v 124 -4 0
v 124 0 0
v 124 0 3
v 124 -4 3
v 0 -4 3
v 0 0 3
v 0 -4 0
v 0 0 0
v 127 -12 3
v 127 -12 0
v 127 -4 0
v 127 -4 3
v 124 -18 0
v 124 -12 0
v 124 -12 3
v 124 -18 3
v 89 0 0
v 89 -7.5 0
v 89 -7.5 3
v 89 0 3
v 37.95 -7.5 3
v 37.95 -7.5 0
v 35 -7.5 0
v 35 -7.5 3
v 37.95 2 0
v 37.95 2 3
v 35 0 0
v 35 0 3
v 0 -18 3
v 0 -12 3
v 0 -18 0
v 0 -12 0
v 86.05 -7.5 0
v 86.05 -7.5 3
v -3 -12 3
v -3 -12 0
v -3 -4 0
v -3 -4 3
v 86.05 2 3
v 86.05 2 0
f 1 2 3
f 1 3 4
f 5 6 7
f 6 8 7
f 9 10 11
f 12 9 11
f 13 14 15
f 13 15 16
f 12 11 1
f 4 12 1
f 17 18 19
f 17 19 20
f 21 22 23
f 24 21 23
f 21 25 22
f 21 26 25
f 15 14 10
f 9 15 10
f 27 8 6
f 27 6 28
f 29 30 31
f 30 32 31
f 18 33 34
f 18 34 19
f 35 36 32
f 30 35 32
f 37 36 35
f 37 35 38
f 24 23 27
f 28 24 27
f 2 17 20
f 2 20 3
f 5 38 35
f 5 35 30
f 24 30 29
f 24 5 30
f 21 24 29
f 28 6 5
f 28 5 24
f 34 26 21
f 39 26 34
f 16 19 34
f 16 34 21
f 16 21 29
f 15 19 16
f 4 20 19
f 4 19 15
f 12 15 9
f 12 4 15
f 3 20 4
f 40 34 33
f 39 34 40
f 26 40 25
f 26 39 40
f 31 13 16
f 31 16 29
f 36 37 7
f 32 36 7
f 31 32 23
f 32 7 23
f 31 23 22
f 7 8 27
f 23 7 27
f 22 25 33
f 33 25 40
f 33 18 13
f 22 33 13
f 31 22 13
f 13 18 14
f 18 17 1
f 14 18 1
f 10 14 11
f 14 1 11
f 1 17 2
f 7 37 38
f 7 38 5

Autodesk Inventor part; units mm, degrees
ref_plane "YZ Plane" through (0, 0, 0) normal (1, 0, 0) x (0, 1, 0)
ref_plane "XZ Plane" through (0, 0, 0) normal (0, 1, 0) x (-1, 0, 0)
ref_plane "XY Plane" through (0, 0, 0) normal (0, 0, 1) x (1, 0, 0)
sketch "草圖1" plane through (0, 0, 0) normal (0, 0, 1) x (1, 0, 0)
  line L0 (0, 0) -> (124, 0)
  line L1 (124, 0) -> (124, -18) construction
  line L2 (124, -18) -> (0, -18)
  line L3 (0, -18) -> (0, 0) construction
  line L4 (35, 0) -> (37.95, 0)
  line L5 (37.95, 0) -> (37.95, -7.5)
  line L6 (37.95, -7.5) -> (35, -7.5)
  line L7 (35, -7.5) -> (35, 0)
  line L8 (89, 0) -> (86.05, 0)
  line L9 (86.05, 0) -> (86.05, -7.5)
  line L10 (86.05, -7.5) -> (89, -7.5)
  line L11 (89, -7.5) -> (89, 0)
  line L12 (0, -18) -> (0, 0) construction
  line L13 (-3, -12) -> (0, -12)
  line L14 (0, -12) -> (0, -18)
  line L15 (124, -12) -> (124, -18)
  line L16 (-3, -12) -> (-3, -4)
  line L17 (-3, -4) -> (0, -4)
  line L18 (0, 0) -> (0, -4)
  line L19 (124, -12) -> (127, -12)
  line L20 (127, -12) -> (127, -4)
  line L21 (127, -4) -> (124, -4)
  line L22 (124, -4) -> (124, -12)
  line L23 (124, 0) -> (124, -4)
  point P0 (0, -15.5)
  dimension "d0" = 124
  dimension "d1" = 35
  dimension "d3" = 2.95
  dimension "d4" = 2.95
  dimension "d10" = 10.5
  dimension "d16" = 7.5
  dimension "d17" = 35
  dimension "d29" = 8
  dimension "d30" = 4
  dimension "d31" = 3
  dimension "d32" = 3
  dimension "d33" = 4
  dimension "d34" = 8
extrude "擠出1" add sketch "草圖1" along normal blind 3 contours L0 L7 L6 L5 L9 L10 L11 L23 L22 L15 L2 L14 L13 L16 L17 L18 | L21 L20 L19 L22
sketch "草圖2" plane through (0, 0, 3) normal (0, 0, 1) x (1, 0, 0)
  line L0 (37.95, 0) -> (86.05, 0)
  line L1 (86.05, 0) -> (86.05, 2)
  line L2 (86.05, 2) -> (37.95, 2)
  line L3 (37.95, 2) -> (37.95, 0)
  line L4 (86.05, -7.5) -> (86.05, 0) projected
  point P0 (0, 0)
  dimension "d26" = 2
extrude "擠出2" add sketch "草圖2" against normal up to surface (3 mm away)
sketch "草圖3" plane through (0, 0, 3) normal (0, 0, 1) x (1, 0, 0)
  line L0 (124, 0) -> (89, 0) projected
  line L1 (89, 0) -> (89, -7.5) projected
  line L2 (89, -7.5) -> (86.05, -7.5) projected
  line L3 (86.05, -7.5) -> (86.05, 2) projected
  line L4 (37.95, -7.5) -> (35, -7.5) projected
  line L5 (35, -7.5) -> (35, 0) projected
  line L6 (35, 0) -> (0, 0) projected
  line L7 (0, -4) -> (-3, -4) projected
  line L8 (-3, -4) -> (-3, -12) projected
  line L9 (-3, -12) -> (0, -12) projected
  line L10 (0, -12) -> (0, -18) projected
  line L11 (0, -18) -> (124, -18) projected
  line L12 (124, -18) -> (124, -12) projected
  line L13 (124, -12) -> (127, -12) projected
  line L14 (127, -12) -> (127, -4) projected
  line L15 (127, -4) -> (124, -4) projected
  line L16 (124, -4) -> (124, 0) projected
  line L17 (86.05, 2) -> (37.95, 2) projected
  line L18 (37.95, 2) -> (37.95, -7.5) projected
  line L19 (0, 0) -> (0, -4) projected
properties part number "chassis_1_6"
